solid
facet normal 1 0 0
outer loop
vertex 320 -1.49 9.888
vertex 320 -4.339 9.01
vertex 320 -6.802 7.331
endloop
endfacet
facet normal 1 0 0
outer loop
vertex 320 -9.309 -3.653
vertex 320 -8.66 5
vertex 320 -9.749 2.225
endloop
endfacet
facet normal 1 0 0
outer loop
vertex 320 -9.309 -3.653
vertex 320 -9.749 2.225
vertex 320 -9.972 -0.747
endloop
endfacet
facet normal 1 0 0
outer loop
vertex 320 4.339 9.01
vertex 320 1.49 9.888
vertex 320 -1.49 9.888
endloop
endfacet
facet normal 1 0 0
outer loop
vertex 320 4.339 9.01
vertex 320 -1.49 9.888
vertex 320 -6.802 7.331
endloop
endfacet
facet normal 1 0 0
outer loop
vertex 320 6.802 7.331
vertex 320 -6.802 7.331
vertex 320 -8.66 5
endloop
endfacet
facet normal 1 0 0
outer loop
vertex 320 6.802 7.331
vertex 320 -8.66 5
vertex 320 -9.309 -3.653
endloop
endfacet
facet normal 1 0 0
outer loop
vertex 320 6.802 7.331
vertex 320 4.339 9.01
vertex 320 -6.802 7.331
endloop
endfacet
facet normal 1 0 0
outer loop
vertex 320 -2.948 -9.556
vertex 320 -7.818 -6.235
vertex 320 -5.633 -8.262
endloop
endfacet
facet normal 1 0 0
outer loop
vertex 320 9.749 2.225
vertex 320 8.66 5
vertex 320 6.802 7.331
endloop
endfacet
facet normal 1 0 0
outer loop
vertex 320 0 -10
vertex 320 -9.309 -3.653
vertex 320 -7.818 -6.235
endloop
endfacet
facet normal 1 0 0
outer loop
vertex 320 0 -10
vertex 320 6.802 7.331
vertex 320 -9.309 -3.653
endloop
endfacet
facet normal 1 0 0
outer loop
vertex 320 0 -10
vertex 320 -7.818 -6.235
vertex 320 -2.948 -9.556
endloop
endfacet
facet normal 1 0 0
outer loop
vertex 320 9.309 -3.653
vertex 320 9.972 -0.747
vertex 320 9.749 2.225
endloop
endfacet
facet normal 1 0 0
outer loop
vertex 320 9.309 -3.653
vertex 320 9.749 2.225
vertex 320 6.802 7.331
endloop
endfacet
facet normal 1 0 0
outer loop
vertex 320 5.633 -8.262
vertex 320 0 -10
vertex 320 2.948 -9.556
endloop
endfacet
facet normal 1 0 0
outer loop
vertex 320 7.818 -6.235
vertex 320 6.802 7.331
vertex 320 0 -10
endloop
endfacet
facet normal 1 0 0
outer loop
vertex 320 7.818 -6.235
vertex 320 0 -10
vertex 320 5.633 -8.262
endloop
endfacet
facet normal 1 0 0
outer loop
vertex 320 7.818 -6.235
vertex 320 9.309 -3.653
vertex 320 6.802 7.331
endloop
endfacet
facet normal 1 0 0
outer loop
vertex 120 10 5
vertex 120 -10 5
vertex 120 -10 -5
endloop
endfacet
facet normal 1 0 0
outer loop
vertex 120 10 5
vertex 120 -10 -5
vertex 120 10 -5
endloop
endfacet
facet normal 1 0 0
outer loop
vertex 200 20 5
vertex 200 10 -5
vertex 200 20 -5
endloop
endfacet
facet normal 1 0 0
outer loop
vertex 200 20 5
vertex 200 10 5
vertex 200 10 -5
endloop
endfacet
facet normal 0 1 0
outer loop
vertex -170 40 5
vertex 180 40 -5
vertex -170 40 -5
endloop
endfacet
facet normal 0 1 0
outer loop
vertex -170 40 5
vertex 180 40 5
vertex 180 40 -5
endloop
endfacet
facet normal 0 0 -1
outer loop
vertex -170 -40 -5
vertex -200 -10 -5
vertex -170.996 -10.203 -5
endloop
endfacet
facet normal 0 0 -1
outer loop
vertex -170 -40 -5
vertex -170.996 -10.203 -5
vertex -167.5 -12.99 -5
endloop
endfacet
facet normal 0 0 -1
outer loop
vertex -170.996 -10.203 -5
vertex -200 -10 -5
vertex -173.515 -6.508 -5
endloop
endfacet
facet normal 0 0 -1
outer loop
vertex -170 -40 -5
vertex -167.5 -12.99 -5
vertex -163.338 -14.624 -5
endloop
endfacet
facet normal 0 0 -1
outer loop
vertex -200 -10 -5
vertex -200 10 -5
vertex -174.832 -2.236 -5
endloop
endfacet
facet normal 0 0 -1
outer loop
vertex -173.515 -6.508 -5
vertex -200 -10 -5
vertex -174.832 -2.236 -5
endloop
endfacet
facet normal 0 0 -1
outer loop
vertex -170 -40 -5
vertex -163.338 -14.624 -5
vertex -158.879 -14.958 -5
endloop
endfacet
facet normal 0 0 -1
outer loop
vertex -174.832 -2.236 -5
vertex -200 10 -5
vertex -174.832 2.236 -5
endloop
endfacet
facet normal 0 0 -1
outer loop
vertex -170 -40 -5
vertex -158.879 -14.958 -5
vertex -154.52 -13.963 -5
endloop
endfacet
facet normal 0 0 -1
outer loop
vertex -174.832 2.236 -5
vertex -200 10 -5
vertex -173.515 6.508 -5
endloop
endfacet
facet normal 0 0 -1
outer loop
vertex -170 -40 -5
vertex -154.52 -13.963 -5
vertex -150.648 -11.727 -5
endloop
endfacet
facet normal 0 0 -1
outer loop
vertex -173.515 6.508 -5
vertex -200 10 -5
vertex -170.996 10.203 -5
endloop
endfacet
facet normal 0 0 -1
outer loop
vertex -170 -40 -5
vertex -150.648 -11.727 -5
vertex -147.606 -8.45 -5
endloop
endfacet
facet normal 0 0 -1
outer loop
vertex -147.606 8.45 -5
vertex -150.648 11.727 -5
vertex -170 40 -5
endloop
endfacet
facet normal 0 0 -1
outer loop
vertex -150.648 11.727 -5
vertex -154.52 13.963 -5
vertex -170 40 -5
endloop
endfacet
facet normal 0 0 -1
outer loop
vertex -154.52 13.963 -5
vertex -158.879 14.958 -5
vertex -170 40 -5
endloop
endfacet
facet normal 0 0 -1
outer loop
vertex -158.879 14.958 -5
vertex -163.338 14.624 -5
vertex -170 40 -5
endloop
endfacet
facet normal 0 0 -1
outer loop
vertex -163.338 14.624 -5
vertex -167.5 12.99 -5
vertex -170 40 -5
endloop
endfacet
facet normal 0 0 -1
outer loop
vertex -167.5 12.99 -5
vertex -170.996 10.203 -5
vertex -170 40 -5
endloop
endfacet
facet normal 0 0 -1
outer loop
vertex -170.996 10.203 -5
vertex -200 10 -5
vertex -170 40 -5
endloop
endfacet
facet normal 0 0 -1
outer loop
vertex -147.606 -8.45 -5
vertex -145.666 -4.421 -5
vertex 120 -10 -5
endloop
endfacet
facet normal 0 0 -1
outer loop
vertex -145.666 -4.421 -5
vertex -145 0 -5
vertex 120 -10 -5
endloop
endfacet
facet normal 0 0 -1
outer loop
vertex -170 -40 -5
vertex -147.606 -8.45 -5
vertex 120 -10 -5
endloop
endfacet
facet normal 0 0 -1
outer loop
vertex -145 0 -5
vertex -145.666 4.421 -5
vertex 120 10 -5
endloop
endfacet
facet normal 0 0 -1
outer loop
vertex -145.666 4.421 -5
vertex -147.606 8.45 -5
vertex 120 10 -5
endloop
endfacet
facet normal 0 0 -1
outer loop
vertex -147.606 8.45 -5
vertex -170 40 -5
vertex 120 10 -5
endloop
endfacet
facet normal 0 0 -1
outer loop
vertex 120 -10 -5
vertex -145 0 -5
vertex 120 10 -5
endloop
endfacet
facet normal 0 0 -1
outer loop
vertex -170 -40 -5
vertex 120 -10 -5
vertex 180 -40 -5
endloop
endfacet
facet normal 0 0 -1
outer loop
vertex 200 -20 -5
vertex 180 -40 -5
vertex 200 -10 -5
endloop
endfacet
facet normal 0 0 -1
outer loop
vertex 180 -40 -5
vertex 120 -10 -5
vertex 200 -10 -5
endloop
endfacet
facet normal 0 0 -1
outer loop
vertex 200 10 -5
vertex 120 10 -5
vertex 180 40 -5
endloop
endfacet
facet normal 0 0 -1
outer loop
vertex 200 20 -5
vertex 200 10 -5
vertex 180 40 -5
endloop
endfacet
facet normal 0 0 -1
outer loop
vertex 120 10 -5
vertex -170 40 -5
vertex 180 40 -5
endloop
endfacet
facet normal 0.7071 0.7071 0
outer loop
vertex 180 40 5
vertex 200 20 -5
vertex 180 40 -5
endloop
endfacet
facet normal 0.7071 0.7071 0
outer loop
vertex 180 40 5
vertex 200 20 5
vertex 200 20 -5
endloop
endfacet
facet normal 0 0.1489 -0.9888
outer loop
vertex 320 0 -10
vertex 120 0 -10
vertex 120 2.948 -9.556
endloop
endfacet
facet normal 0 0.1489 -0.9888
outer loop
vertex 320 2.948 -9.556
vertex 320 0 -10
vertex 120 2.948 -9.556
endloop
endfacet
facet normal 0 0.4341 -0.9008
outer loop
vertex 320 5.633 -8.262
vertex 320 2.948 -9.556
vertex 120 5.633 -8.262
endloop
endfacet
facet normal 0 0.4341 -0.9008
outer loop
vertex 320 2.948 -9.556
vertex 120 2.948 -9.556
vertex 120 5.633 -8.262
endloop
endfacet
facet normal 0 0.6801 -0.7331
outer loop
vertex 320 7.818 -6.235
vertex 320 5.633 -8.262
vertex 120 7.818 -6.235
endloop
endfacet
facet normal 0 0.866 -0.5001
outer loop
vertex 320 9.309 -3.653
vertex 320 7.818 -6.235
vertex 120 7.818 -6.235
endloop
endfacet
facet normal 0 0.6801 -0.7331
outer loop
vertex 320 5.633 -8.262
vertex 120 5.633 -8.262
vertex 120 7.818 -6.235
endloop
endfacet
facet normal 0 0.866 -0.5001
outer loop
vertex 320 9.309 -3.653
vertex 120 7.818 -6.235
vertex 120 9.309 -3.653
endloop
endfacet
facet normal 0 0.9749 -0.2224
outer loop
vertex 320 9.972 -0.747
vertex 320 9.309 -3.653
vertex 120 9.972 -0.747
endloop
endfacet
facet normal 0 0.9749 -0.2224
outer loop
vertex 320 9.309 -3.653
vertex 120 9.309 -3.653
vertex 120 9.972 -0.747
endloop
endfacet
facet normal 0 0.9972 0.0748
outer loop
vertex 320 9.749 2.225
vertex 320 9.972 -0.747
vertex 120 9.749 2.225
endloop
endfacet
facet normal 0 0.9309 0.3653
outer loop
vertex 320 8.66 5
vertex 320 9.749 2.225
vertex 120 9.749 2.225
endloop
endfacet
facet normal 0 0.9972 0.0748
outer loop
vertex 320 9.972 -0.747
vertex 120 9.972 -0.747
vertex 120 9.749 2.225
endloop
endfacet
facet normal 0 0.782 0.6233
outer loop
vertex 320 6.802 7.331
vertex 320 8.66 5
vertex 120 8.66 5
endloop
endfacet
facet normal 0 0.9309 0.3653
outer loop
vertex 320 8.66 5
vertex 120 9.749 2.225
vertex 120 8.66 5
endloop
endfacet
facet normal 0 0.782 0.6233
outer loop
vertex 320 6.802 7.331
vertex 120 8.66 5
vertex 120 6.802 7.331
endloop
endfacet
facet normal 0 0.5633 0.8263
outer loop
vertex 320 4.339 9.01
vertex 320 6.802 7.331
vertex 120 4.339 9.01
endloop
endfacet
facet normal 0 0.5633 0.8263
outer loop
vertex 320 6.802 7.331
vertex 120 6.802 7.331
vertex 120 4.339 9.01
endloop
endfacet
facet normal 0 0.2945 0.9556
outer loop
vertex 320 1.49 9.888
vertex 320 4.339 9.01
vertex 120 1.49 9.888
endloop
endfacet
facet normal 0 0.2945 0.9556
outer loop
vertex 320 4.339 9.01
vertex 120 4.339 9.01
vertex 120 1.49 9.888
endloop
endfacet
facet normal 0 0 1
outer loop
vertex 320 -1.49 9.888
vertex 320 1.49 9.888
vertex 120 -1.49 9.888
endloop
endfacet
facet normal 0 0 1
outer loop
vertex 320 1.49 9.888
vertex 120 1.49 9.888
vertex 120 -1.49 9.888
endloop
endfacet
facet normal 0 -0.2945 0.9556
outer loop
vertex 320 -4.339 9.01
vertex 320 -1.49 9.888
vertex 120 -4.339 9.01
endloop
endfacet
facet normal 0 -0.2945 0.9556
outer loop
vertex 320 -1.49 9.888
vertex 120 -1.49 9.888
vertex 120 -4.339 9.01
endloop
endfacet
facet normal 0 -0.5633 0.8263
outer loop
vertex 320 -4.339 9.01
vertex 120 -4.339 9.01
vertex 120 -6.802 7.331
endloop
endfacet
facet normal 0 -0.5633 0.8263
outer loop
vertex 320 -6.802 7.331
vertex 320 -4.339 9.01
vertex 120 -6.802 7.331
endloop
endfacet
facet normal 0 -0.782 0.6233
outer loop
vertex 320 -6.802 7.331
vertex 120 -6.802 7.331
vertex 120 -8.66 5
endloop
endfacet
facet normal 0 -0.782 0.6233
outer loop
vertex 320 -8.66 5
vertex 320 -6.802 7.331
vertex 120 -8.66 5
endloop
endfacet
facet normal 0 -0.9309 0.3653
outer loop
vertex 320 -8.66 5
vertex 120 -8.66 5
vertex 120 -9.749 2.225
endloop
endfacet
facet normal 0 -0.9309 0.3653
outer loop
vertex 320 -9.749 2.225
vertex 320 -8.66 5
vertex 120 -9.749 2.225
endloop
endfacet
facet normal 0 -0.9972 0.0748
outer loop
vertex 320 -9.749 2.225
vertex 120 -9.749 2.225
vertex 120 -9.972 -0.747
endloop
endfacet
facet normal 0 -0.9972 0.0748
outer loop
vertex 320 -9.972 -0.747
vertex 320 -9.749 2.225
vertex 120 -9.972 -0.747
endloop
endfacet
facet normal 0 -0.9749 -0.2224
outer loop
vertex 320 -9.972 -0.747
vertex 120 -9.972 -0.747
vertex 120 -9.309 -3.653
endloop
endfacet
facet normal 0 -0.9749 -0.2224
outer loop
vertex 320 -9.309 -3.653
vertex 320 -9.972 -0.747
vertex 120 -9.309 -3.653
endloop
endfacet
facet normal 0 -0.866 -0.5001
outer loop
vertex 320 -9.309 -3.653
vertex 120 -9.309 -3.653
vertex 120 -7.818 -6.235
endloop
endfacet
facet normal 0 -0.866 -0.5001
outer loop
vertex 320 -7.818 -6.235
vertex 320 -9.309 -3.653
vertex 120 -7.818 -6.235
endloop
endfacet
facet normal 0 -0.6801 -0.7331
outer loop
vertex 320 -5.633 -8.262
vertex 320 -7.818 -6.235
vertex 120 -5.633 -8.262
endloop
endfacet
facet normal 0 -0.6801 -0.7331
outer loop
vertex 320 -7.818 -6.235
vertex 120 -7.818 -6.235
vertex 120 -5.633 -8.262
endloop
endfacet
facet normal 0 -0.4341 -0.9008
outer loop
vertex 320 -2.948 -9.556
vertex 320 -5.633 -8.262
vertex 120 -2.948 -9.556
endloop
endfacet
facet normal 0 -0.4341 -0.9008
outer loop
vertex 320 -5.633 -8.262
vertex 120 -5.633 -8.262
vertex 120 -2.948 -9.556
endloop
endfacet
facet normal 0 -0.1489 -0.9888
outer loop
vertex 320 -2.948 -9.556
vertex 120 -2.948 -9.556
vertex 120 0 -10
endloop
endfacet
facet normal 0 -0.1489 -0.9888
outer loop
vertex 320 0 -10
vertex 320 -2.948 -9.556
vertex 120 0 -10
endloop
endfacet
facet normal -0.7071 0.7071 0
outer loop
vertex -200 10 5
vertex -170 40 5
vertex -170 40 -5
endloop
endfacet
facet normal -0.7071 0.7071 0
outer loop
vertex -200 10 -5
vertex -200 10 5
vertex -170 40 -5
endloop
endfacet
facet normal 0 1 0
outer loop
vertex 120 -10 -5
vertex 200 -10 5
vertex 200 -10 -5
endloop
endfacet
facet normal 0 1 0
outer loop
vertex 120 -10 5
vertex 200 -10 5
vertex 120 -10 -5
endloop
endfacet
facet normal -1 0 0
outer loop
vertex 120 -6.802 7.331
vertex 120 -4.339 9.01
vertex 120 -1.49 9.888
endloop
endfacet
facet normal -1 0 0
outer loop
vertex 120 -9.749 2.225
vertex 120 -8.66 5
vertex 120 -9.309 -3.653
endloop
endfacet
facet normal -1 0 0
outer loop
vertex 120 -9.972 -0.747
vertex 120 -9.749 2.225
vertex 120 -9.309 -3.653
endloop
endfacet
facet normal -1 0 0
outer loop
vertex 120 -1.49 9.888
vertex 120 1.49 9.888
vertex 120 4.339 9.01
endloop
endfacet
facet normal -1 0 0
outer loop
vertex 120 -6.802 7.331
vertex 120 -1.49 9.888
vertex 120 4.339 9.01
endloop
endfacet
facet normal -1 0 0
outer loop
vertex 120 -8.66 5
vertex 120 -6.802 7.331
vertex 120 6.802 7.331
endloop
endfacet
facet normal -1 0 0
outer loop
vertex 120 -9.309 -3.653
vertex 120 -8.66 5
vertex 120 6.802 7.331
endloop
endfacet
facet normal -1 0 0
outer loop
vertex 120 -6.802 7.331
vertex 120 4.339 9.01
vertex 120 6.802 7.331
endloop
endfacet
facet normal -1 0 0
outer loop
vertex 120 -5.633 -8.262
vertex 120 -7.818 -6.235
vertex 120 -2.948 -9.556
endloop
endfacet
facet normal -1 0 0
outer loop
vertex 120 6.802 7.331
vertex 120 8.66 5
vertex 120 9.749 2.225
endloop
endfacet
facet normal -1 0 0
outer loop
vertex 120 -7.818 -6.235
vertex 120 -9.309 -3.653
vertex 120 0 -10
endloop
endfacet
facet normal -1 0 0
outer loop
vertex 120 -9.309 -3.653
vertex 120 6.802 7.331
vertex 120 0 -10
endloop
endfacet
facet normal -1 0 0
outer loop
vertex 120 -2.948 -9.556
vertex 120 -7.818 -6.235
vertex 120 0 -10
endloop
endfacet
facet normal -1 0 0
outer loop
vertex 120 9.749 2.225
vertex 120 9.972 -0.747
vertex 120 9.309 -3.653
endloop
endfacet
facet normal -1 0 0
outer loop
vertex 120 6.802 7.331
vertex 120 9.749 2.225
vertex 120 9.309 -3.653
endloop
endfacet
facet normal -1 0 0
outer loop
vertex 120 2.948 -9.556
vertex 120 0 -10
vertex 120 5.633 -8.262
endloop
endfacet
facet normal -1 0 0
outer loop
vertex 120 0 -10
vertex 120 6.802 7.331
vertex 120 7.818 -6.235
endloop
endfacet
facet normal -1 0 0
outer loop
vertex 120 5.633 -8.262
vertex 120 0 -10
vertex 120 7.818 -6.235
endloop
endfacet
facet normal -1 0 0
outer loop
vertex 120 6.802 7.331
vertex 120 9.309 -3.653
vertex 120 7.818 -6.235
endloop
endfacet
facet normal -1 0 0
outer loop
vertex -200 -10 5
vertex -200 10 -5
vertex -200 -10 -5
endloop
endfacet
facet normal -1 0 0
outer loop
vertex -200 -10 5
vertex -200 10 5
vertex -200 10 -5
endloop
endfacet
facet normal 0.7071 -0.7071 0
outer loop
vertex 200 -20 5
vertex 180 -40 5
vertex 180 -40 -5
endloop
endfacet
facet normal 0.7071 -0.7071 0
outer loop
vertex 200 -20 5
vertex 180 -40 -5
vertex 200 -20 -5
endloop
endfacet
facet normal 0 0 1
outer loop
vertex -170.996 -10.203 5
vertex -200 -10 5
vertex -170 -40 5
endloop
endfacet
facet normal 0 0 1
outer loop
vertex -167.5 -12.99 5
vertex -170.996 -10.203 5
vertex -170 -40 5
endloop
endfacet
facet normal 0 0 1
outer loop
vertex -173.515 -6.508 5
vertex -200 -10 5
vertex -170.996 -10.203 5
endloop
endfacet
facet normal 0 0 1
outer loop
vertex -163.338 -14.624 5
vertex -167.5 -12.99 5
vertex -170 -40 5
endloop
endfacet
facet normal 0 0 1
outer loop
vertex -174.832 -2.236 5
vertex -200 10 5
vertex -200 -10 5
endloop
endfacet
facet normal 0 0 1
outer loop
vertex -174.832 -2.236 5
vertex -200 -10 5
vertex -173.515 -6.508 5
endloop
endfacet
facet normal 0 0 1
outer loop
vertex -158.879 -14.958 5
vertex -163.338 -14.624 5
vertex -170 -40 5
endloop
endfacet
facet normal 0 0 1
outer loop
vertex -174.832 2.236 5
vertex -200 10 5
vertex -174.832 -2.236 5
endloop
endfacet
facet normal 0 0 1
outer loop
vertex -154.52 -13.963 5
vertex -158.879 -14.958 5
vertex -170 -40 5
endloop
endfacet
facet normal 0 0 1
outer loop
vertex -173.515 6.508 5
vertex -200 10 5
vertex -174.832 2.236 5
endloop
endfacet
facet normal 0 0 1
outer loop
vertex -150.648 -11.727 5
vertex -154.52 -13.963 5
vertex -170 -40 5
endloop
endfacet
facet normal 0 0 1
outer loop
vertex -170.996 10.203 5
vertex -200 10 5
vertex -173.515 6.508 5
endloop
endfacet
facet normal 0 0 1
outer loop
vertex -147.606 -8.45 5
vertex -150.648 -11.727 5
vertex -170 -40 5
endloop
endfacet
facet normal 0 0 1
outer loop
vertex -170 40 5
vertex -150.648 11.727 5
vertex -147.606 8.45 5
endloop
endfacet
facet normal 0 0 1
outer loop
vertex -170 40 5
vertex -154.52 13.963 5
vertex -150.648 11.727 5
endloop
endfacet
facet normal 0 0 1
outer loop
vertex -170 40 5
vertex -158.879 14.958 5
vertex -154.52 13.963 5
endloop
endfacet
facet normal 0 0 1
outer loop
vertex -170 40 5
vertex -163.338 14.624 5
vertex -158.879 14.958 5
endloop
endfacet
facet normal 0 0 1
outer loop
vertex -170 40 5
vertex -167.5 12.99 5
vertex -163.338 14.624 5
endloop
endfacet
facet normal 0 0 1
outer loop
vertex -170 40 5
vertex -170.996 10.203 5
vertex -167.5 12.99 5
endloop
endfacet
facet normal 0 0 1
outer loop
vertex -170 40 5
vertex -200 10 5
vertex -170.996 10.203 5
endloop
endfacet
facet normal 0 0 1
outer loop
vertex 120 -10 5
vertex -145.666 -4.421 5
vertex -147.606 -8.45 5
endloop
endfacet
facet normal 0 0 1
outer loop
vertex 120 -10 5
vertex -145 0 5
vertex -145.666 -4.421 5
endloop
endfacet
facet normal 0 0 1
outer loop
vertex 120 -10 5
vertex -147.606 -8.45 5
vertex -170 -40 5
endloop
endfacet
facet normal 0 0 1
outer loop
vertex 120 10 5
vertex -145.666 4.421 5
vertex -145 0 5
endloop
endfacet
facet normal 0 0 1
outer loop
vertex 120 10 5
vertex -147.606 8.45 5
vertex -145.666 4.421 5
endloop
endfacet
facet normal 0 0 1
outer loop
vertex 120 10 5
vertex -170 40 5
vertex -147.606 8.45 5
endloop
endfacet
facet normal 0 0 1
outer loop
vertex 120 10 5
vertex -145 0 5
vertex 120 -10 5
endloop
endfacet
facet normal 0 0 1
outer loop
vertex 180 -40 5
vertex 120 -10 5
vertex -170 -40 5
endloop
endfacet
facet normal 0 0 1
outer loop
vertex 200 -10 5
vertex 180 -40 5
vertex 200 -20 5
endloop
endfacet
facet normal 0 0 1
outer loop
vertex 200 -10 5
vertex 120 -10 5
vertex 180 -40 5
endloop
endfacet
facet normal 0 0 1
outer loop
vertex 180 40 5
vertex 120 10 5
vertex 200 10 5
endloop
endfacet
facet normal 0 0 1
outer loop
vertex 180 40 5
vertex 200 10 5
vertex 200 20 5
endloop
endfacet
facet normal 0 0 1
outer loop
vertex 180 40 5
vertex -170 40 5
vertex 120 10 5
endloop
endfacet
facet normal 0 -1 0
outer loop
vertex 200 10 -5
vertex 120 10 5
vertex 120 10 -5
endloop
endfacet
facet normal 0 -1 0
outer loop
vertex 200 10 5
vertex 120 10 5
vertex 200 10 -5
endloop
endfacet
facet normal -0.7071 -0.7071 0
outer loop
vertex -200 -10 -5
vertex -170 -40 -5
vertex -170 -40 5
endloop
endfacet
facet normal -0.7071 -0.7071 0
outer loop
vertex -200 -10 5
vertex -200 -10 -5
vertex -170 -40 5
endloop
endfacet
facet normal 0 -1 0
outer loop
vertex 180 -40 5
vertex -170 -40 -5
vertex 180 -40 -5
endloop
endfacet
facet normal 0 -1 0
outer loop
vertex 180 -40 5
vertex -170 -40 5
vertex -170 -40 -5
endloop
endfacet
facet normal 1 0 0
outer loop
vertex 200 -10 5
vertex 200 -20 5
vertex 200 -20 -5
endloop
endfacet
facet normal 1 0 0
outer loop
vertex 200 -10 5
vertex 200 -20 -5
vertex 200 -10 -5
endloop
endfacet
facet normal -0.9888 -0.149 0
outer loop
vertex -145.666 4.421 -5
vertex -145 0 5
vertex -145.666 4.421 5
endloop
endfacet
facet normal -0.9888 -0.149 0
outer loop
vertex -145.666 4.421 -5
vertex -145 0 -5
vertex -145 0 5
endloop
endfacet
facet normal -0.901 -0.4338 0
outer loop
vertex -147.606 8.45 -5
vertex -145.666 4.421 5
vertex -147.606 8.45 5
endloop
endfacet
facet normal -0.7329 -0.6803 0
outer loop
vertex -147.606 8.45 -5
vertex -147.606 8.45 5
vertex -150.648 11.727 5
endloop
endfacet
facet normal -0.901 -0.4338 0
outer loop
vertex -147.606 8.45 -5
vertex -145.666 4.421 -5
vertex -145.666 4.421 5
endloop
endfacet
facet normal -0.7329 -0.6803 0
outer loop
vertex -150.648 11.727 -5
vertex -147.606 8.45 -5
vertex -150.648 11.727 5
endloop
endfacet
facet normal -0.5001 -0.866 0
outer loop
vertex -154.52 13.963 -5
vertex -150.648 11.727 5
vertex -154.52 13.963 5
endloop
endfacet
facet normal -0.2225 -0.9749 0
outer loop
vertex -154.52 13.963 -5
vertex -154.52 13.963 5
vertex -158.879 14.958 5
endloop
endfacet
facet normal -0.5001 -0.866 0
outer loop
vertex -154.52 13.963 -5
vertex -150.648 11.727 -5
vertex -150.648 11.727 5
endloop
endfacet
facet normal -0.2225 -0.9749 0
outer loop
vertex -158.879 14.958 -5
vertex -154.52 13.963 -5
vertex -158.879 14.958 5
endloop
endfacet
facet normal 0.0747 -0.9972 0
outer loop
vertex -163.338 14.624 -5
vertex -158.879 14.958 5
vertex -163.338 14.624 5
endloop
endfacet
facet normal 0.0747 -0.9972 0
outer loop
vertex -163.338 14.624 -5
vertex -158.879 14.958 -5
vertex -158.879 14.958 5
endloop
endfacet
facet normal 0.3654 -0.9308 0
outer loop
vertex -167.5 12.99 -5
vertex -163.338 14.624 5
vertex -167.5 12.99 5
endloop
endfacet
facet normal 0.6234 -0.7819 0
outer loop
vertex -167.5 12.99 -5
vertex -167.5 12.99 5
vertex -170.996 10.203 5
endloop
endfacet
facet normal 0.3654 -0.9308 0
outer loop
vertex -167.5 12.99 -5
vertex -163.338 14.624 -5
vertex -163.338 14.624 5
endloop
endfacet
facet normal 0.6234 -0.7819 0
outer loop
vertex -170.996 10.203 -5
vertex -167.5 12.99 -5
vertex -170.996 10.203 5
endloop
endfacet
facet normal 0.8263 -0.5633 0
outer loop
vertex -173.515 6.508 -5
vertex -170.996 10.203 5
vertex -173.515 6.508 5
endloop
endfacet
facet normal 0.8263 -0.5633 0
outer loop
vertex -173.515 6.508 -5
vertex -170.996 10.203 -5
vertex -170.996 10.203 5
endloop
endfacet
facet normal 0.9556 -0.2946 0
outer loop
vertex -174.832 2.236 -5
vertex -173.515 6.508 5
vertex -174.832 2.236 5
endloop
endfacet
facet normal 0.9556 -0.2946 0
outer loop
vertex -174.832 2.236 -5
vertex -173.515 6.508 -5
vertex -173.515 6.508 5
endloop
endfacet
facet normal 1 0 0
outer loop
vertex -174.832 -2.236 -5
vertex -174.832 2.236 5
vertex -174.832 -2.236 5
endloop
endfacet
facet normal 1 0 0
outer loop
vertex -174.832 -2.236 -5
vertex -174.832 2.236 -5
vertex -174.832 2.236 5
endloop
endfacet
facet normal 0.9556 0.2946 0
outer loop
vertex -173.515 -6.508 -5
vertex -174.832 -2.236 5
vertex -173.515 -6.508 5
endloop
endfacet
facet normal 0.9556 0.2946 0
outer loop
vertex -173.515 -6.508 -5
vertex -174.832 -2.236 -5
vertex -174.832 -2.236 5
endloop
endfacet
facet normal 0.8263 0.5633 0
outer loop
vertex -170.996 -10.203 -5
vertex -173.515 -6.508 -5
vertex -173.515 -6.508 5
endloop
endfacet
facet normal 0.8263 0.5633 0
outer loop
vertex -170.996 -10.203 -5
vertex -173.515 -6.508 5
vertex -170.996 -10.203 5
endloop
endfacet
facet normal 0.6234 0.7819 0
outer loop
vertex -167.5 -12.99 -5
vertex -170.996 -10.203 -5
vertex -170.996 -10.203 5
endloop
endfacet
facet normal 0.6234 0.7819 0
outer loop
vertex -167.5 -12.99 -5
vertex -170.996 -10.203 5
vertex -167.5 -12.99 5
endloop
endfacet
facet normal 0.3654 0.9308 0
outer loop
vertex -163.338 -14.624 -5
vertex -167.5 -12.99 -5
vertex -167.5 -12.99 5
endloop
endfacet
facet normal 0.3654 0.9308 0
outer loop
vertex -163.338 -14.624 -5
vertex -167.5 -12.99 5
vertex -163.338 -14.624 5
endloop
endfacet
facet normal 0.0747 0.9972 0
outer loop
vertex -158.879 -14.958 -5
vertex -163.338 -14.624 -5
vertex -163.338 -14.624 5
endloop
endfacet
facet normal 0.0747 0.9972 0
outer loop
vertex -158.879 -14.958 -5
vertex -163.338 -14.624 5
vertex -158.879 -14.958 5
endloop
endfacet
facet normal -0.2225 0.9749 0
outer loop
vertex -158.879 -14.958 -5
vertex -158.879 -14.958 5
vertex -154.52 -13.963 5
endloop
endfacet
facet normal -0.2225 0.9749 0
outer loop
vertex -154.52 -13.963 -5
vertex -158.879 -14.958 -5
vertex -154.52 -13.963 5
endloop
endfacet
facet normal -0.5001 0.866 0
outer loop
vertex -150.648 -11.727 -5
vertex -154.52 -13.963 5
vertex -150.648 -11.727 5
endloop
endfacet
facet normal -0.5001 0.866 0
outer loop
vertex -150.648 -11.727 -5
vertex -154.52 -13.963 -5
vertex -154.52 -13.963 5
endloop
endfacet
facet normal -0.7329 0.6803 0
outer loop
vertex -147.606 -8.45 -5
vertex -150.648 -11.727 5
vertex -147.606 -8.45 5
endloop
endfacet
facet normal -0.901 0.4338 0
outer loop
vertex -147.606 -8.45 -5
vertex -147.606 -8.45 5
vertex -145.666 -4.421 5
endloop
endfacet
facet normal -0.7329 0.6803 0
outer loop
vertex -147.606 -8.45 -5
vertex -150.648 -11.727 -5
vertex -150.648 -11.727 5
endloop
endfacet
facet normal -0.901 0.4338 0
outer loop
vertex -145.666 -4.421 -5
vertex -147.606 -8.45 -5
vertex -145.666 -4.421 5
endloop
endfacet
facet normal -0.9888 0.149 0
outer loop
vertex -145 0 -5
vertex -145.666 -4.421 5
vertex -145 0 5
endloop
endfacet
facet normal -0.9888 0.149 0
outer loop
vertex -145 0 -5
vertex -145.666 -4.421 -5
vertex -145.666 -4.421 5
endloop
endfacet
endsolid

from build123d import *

# Parameters (mm, degrees)
SKETCH1_R           = 15
BOSS_EXTRUDE1_DEPTH = 5
BOSS_EXTRUDE3_START = 120
SKETCH3_R           = 10
BOSS_EXTRUDE3_DEPTH = 200
CHAMFER1_SIZE       = 30


with BuildPart() as part:
    # Sketch1 → Boss-Extrude1 (new, symmetric)
    with BuildSketch(Plane.XY):
        Polygon((-200, 40), (-200, -40), (180, -40), (200, -20), (200, -10), (120, -10), (120, 10), (200, 10), (200, 20), (180, 40), align=None)
        with Locations((-160, 0)):
            Circle(SKETCH1_R, mode=Mode.SUBTRACT)
    extrude(amount=BOSS_EXTRUDE1_DEPTH, both=True)

    # Chamfer1
    chamfer1_edges = [part.edges().sort_by_distance(p)[0] for p in [
        (-200, -40, 0),
        (-200, 40, 0),
    ]]
    chamfer(chamfer1_edges, length=CHAMFER1_SIZE)


with BuildPart() as body_2:
    # Sketch3 → Boss-Extrude3 (new body)
    with BuildSketch(Plane(origin=(0, 0, 0), x_dir=(0, 0, -1), z_dir=(1, 0, 0)).offset(BOSS_EXTRUDE3_START)):
        Circle(SKETCH3_R)
    extrude(amount=BOSS_EXTRUDE3_DEPTH)


solid = Compound([part.part, body_2.part])
